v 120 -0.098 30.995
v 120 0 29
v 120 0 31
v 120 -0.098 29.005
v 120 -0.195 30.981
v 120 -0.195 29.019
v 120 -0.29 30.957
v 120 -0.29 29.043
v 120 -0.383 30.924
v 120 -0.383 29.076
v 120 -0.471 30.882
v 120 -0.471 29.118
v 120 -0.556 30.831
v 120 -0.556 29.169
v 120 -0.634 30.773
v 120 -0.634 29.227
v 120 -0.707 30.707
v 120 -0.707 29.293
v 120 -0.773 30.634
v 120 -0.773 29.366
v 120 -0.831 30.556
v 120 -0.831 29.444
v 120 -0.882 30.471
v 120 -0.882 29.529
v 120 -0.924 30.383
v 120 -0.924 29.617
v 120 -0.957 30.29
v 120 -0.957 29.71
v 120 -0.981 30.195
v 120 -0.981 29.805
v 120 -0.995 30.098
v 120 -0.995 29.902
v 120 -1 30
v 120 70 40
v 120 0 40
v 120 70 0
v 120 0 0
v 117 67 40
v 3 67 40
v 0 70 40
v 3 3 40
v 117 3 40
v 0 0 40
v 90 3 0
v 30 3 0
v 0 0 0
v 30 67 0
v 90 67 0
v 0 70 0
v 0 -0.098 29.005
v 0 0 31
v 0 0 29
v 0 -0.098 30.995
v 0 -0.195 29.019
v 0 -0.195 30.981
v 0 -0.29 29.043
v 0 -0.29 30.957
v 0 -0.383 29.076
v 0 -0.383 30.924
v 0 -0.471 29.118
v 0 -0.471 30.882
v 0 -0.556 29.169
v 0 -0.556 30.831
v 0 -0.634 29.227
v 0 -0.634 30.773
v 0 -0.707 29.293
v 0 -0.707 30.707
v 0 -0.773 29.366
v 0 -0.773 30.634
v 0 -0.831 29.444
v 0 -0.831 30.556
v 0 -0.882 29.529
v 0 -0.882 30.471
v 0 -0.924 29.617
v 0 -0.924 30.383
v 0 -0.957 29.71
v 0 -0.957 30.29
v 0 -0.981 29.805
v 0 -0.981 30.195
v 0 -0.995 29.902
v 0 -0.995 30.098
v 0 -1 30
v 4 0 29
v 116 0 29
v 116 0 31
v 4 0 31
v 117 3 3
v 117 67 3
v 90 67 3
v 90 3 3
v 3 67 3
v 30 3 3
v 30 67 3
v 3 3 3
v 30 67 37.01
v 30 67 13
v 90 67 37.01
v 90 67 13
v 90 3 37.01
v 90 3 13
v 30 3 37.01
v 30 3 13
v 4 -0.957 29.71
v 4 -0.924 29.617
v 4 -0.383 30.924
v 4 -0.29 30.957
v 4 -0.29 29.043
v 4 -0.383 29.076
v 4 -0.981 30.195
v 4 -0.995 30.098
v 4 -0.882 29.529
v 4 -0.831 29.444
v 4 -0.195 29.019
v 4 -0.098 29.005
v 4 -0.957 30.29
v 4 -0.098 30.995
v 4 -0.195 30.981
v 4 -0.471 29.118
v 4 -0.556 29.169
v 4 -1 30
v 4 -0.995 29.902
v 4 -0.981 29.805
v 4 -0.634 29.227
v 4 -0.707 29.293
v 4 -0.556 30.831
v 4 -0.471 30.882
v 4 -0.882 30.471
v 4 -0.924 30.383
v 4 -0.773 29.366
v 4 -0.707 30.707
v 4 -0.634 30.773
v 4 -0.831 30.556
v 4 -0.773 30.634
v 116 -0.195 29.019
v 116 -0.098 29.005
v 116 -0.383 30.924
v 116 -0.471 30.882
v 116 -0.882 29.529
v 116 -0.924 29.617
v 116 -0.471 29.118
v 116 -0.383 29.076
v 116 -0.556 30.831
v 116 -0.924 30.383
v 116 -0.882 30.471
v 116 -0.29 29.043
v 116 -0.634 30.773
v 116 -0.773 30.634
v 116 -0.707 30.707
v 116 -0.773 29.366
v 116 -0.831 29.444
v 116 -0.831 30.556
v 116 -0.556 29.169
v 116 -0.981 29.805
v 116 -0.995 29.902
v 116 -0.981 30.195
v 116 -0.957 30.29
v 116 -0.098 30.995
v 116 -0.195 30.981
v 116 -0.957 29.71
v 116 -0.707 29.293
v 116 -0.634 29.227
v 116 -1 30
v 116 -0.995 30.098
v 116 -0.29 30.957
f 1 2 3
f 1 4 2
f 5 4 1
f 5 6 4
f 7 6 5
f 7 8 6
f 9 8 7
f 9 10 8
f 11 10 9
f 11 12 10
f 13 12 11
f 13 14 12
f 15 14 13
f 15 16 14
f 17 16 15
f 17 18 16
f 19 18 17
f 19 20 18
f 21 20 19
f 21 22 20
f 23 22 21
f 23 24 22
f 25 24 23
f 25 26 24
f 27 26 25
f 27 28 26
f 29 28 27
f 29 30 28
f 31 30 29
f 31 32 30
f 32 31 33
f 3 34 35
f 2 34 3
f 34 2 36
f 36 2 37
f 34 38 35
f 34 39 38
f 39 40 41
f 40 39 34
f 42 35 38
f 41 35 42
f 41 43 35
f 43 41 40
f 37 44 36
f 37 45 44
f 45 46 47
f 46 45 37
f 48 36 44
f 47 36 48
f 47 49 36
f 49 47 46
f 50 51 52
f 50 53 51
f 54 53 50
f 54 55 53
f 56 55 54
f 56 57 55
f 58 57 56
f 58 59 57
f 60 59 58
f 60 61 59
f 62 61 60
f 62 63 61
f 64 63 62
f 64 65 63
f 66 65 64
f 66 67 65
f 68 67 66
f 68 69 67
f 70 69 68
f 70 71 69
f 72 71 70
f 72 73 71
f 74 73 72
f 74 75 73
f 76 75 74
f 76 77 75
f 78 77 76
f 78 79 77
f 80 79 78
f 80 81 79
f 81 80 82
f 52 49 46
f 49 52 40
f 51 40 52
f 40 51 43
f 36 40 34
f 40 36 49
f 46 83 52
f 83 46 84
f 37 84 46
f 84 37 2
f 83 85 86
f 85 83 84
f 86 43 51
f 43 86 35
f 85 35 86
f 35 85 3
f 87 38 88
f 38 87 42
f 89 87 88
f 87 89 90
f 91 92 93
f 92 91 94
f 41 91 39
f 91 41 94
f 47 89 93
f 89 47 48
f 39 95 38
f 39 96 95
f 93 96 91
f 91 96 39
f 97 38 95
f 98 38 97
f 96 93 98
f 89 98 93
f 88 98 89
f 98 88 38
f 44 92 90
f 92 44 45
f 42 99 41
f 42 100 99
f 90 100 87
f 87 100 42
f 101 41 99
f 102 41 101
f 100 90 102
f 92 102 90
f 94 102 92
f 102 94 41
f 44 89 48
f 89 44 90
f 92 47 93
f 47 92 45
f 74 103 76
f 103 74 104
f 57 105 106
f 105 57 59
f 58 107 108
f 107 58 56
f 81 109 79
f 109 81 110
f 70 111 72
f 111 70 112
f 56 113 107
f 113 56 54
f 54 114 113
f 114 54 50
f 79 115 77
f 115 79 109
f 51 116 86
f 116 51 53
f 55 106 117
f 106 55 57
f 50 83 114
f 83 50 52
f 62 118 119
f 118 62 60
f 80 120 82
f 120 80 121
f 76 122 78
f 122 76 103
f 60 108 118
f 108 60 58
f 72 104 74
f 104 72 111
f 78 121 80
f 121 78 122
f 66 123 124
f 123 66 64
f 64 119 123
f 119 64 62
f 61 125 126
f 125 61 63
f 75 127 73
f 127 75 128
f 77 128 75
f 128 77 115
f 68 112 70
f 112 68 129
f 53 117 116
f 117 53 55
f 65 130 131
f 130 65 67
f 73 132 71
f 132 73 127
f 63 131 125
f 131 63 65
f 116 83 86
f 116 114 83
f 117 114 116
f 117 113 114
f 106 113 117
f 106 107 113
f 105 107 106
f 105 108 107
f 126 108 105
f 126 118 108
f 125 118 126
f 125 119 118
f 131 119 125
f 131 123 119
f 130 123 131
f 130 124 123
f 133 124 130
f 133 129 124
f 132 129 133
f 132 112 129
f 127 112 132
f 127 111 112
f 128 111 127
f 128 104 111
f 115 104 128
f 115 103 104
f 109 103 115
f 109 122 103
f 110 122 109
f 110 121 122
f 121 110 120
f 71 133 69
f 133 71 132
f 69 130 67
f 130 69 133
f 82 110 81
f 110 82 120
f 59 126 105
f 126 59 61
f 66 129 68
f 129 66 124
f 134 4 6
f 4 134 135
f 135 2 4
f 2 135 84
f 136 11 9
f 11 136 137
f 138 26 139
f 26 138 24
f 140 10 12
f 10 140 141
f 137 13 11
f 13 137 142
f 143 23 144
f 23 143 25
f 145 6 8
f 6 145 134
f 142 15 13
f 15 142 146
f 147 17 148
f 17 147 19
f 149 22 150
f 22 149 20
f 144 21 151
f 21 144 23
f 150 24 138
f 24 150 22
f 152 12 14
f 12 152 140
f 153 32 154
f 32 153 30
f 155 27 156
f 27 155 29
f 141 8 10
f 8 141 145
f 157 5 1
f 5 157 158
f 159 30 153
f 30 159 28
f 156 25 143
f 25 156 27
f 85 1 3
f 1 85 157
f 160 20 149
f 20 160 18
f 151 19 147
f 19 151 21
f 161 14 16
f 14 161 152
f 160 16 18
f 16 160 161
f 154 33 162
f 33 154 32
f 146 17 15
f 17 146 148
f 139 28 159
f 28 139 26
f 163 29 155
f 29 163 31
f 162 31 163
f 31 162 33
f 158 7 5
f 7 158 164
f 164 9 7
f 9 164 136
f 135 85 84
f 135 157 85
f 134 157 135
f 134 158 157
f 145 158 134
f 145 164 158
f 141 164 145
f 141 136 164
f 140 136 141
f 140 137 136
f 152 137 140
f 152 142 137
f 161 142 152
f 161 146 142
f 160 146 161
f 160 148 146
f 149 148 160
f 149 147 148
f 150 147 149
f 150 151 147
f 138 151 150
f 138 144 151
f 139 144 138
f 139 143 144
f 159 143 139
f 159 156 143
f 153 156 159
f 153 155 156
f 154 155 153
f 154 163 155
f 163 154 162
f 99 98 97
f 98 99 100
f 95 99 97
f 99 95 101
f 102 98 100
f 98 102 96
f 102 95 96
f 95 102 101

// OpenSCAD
// Buffer tank for mini horizontal gel-electrophoresis box
// Outer dimensions: 120mm (X) x 70mm (Y) x 40mm (Z)
// Wall thickness: 3mm, Floor thickness: 3mm
// Platform: 60mm long in X (centred), full inner width (Y), top at z = 13mm (10mm above inner floor)

// Dimensions
outer_x = 120;
outer_y = 70;
outer_z = 40;
wall_thick = 3;
floor_thick = 3;
platform_height = 13; // z-coordinate of platform top
platform_len = 60;
hole_dia = 2;
hole_z = 30;

// Derived dimensions
inner_x = outer_x - 2 * wall_thick;
inner_y = outer_y - 2 * wall_thick;
inner_z = outer_z - floor_thick;
platform_width = inner_y; // spans full inner width
platform_start_x = (inner_x - platform_len) / 2;
platform_end_x = platform_start_x + platform_len;

// Function to make holes extend through walls
module extend_hole(x, y, z, dia, len) {
    extend = 1; // extra length to ensure clean cut
    translate([x, y, z]) 
    rotate([0, 90, 0]) 
    cylinder(h = len + 2 * extend, r = dia / 2, $fn = 64);
}

// Main tank shell (outer box with hollow interior)
module tank_shell() {
    difference() {
        // Outer shell
        cube([outer_x, outer_y, outer_z]);
        
        // Hollow interior (walls and floor only)
        translate([wall_thick, wall_thick, floor_thick])
            cube([inner_x, inner_y, inner_z]);
        
        // Cut out platform area from the bottom (to create hollow under platform)
        // Platform is at platform_height (z=13), so we need to hollow from z=0 to z=platform_height
        // but only for the platform area (centred in X, full inner Y)
        translate([wall_thick + platform_start_x, wall_thick, 0])
            cube([platform_len, inner_y, platform_height + 0.01]);
    }
}

// Platform (solid raised platform)
module platform() {
    translate([wall_thick + platform_start_x, wall_thick, platform_height])
        cube([platform_len, inner_y, inner_z - platform_height + 0.01]);
}

// Electrode holes in end walls
module electrode_holes() {
    // Left hole (at x=0 wall, y=0, z=30)
    // Hole goes through the left wall (at x=0) along +X direction
    translate([0, 0, hole_z])
        rotate([0, 90, 0])
        cylinder(h = wall_thick + 1, r = hole_dia / 2, $fn = 64);
    
    // Right hole (at x=outer_x wall, y=0, z=30)
    // Hole goes through the right wall (at x=outer_x) along -X direction
    translate([outer_x, 0, hole_z])
        rotate([0, 90, 180]) // Rotate 180° around Y to point left
        cylinder(h = wall_thick + 1, r = hole_dia / 2, $fn = 64);
}

// Build the buffer tank
module buffer_tank() {
    union() {
        // Tank shell
        tank_shell();
        
        // Platform
        platform();
        
        // Electrode holes
        electrode_holes();
    }
}

// Render
$fn = 64;
buffer_tank();
